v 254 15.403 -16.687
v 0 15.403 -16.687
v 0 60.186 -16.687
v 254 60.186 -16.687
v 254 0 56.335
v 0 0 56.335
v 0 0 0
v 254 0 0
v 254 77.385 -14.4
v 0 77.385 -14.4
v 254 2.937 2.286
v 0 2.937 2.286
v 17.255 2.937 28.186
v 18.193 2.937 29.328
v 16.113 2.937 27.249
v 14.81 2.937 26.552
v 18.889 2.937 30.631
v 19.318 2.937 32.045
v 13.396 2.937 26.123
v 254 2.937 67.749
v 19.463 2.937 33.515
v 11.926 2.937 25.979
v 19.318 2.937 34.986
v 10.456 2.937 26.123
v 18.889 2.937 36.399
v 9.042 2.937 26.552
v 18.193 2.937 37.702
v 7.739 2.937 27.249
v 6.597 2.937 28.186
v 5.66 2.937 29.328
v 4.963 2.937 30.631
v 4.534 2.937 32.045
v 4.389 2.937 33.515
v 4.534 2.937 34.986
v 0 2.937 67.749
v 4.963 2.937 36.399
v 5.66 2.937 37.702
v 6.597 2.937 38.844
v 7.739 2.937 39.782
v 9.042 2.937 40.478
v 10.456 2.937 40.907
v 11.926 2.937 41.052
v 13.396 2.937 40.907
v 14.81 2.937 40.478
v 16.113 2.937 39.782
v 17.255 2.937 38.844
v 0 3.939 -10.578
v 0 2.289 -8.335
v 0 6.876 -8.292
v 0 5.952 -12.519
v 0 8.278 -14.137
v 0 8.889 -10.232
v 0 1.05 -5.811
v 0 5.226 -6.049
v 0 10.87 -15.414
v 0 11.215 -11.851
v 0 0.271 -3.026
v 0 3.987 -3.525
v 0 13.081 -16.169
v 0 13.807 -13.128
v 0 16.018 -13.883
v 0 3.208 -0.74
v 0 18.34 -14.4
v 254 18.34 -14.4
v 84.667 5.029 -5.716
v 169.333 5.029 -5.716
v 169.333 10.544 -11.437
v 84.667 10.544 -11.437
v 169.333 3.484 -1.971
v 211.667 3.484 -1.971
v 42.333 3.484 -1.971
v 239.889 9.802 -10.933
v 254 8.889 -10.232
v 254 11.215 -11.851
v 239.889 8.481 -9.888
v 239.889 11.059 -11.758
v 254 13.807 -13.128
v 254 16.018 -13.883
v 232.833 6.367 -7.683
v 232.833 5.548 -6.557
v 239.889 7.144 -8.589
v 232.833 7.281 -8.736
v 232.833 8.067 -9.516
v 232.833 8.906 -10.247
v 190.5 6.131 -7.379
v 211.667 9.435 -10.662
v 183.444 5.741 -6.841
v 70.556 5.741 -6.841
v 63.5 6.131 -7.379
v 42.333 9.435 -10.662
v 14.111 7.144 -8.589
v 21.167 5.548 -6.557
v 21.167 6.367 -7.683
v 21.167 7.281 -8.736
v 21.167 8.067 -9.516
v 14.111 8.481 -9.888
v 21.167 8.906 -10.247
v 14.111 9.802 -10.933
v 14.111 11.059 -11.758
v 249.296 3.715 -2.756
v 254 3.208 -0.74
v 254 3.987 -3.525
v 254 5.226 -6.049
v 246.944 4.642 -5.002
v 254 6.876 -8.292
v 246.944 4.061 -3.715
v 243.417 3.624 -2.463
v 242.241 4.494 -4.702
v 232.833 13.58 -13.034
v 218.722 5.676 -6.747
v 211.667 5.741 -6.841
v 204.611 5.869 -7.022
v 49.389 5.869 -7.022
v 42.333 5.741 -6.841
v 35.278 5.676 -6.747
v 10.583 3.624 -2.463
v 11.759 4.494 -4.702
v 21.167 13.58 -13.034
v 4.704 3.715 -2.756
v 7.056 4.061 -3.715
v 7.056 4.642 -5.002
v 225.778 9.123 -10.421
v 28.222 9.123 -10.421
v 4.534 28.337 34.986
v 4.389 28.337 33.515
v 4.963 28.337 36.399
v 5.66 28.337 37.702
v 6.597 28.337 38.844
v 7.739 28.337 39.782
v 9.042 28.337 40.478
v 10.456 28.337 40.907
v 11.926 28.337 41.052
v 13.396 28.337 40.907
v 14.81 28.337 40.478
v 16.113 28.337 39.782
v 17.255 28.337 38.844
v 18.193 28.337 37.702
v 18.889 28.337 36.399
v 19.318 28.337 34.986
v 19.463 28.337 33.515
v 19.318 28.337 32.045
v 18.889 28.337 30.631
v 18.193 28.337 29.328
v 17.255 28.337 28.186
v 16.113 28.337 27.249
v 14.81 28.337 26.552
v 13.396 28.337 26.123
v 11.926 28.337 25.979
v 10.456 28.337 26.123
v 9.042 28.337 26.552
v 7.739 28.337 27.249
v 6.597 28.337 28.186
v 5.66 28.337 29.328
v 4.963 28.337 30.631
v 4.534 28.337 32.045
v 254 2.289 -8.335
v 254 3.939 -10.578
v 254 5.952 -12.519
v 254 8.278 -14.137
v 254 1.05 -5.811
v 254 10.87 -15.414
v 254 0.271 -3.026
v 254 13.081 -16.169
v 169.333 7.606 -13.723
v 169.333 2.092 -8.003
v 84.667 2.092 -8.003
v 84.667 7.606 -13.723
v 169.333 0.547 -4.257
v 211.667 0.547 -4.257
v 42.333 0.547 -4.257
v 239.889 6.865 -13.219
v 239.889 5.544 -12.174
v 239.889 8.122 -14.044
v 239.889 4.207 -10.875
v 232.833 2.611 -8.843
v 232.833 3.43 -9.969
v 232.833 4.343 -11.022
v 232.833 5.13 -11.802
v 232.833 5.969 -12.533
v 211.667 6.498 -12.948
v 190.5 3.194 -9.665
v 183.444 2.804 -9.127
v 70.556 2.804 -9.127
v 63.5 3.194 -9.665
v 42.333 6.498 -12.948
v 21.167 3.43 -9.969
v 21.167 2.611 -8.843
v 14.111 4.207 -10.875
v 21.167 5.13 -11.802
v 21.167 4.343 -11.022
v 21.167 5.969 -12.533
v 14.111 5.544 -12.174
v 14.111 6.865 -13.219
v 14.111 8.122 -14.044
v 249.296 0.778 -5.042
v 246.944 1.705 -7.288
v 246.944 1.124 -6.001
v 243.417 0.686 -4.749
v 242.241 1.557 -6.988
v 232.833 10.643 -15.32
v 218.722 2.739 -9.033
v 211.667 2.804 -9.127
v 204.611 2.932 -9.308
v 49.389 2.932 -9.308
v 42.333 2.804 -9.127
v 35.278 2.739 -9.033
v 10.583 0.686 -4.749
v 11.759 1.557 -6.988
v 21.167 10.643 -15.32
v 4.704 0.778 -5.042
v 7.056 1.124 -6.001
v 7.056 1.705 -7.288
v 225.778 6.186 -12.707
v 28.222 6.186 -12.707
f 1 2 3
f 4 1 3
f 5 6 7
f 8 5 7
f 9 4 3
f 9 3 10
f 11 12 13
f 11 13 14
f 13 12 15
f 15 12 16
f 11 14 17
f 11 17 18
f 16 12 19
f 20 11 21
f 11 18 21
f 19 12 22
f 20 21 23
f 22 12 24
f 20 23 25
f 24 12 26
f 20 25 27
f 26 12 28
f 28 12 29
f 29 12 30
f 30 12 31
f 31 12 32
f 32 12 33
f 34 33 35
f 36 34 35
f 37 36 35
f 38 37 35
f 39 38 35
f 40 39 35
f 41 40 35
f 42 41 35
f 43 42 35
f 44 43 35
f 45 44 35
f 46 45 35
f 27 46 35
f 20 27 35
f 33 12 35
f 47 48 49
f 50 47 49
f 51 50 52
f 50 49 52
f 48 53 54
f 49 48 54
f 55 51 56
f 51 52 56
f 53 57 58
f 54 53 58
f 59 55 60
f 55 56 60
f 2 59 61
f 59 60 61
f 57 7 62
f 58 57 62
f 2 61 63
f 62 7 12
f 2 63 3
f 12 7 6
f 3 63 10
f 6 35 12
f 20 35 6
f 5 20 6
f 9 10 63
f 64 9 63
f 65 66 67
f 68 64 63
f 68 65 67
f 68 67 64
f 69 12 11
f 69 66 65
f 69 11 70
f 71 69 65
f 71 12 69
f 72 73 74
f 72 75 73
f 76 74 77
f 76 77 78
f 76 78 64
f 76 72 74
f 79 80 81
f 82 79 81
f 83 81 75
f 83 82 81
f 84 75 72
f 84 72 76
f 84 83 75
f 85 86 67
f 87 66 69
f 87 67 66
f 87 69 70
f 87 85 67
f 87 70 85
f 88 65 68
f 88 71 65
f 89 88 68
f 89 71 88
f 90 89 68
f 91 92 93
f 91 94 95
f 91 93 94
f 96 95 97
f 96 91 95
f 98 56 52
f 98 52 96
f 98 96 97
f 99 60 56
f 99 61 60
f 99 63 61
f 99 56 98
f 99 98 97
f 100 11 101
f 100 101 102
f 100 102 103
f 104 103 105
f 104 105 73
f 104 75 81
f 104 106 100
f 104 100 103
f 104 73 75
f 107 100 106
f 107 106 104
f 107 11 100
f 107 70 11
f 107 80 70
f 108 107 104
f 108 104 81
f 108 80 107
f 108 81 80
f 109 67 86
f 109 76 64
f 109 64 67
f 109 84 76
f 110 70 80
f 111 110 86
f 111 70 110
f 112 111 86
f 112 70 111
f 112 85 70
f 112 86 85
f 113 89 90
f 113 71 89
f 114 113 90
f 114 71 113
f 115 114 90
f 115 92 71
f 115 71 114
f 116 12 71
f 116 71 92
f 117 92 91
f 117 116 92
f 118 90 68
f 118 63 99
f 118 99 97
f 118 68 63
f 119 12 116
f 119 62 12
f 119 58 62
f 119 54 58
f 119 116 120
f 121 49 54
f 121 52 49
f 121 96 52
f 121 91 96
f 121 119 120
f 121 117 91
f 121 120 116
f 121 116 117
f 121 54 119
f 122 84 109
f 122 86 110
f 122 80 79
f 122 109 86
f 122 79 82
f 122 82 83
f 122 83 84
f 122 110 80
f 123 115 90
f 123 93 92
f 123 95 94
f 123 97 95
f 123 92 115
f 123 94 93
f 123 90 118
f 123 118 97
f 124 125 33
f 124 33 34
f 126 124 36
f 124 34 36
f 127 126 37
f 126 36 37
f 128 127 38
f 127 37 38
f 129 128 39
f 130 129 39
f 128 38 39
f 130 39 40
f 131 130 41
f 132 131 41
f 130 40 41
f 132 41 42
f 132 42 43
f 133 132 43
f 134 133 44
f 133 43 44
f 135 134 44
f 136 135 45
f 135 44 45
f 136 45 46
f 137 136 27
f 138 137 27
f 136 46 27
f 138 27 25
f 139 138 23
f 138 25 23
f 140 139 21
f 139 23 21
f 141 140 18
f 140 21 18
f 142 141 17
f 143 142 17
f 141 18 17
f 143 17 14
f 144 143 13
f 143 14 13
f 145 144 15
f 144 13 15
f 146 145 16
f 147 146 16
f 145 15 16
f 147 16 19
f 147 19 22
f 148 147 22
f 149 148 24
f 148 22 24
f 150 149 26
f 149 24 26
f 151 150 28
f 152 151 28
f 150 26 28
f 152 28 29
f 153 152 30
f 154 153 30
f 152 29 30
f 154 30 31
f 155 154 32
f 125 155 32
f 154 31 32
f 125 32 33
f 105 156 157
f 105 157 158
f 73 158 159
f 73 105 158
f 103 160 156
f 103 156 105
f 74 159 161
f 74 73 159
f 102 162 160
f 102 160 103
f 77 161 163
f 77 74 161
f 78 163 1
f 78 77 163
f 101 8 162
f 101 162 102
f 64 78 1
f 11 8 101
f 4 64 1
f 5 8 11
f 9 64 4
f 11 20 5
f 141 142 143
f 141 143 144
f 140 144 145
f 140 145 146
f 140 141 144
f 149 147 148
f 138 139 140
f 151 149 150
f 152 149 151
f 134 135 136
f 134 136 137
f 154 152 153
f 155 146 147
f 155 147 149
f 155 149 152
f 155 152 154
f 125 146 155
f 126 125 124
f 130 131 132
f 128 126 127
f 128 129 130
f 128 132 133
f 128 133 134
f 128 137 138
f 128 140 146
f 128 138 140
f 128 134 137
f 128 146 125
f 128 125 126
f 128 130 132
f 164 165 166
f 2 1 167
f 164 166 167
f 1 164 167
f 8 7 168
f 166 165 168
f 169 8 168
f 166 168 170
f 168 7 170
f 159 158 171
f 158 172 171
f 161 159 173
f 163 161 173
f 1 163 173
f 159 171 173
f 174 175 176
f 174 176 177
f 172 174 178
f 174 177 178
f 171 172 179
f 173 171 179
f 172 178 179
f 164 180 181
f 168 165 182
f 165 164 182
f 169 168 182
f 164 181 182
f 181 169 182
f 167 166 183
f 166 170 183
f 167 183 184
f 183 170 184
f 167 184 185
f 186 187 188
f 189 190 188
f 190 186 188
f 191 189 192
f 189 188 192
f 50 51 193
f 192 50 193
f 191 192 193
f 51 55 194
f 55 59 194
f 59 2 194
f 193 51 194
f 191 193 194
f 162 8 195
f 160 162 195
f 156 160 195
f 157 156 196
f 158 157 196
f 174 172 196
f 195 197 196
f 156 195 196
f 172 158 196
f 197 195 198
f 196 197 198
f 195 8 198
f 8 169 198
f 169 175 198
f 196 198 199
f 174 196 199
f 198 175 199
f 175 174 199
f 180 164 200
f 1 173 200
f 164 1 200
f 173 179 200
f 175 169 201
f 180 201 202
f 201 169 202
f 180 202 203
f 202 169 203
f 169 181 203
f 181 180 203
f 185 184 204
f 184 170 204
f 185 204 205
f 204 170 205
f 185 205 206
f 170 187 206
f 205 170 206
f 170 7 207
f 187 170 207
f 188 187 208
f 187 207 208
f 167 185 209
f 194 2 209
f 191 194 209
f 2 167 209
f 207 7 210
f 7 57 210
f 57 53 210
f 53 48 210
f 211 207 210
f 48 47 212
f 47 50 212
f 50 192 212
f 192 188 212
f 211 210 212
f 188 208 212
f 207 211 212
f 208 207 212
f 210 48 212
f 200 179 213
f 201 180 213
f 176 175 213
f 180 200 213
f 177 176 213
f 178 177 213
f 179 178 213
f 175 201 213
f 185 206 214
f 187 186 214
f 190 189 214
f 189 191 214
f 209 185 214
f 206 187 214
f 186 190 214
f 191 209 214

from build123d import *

# Parameters (mm, degrees)
F1_DEPTH = 254
F2_R     = 7.5365841045
F3_DEPTH = 25.4


# Not quite as in the source:
# - the program builds the solid bodies; features that only make, move or delete a surface that nothing else refers to are left out


with BuildPart() as f1:
    # F0 (on Right) → F1 (new body)
    with BuildSketch(Plane.YZ):
        with BuildLine():
            Line((2.9371477504, 67.7488154993), (0, 56.3350282609))
            Line((0, 56.3350282609), (0, 0))
            add(Edge.make_bspline(
                [(0, 0), (0, -8.9850798249), (6.8457759917, -15.2603751048), (15.4029959813, -16.6865773499)],
                knots=[0, 0, 0, 0, 22.7089002123, 22.7089002123, 22.7089002123, 22.7089002123], degree=3))
            Line((15.4029959813, -16.6865773499), (60.1857788861, -16.6865773499))
            Line((60.1857788861, -16.6865773499), (77.3849593316, -14.4004908129))
            Line((77.3849593316, -14.4004908129), (18.3401437317, -14.4004908129))
            add(Edge.make_bspline(
                [(2.9371477504, 2.286086537), (2.9371477504, -6.6989932879), (9.7829237421, -12.9742885678), (18.3401437317, -14.4004908129)],
                knots=[0, 0, 0, 0, 22.7089002123, 22.7089002123, 22.7089002123, 22.7089002123], degree=3))
            Line((2.9371477504, 2.286086537), (2.9371477504, 67.7488154993))
        make_face()
    extrude(amount=F1_DEPTH)

    # F2 (on face) → F3 (join)
    with BuildSketch(Plane(origin=(0, 2.9371477504, 0), x_dir=(-1, 0, 0), z_dir=(0, 1, 0))):
        with Locations((-11.9260810316, 33.5152037442)):
            Circle(F2_R)
    extrude(amount=F3_DEPTH)


solid = f1.part
